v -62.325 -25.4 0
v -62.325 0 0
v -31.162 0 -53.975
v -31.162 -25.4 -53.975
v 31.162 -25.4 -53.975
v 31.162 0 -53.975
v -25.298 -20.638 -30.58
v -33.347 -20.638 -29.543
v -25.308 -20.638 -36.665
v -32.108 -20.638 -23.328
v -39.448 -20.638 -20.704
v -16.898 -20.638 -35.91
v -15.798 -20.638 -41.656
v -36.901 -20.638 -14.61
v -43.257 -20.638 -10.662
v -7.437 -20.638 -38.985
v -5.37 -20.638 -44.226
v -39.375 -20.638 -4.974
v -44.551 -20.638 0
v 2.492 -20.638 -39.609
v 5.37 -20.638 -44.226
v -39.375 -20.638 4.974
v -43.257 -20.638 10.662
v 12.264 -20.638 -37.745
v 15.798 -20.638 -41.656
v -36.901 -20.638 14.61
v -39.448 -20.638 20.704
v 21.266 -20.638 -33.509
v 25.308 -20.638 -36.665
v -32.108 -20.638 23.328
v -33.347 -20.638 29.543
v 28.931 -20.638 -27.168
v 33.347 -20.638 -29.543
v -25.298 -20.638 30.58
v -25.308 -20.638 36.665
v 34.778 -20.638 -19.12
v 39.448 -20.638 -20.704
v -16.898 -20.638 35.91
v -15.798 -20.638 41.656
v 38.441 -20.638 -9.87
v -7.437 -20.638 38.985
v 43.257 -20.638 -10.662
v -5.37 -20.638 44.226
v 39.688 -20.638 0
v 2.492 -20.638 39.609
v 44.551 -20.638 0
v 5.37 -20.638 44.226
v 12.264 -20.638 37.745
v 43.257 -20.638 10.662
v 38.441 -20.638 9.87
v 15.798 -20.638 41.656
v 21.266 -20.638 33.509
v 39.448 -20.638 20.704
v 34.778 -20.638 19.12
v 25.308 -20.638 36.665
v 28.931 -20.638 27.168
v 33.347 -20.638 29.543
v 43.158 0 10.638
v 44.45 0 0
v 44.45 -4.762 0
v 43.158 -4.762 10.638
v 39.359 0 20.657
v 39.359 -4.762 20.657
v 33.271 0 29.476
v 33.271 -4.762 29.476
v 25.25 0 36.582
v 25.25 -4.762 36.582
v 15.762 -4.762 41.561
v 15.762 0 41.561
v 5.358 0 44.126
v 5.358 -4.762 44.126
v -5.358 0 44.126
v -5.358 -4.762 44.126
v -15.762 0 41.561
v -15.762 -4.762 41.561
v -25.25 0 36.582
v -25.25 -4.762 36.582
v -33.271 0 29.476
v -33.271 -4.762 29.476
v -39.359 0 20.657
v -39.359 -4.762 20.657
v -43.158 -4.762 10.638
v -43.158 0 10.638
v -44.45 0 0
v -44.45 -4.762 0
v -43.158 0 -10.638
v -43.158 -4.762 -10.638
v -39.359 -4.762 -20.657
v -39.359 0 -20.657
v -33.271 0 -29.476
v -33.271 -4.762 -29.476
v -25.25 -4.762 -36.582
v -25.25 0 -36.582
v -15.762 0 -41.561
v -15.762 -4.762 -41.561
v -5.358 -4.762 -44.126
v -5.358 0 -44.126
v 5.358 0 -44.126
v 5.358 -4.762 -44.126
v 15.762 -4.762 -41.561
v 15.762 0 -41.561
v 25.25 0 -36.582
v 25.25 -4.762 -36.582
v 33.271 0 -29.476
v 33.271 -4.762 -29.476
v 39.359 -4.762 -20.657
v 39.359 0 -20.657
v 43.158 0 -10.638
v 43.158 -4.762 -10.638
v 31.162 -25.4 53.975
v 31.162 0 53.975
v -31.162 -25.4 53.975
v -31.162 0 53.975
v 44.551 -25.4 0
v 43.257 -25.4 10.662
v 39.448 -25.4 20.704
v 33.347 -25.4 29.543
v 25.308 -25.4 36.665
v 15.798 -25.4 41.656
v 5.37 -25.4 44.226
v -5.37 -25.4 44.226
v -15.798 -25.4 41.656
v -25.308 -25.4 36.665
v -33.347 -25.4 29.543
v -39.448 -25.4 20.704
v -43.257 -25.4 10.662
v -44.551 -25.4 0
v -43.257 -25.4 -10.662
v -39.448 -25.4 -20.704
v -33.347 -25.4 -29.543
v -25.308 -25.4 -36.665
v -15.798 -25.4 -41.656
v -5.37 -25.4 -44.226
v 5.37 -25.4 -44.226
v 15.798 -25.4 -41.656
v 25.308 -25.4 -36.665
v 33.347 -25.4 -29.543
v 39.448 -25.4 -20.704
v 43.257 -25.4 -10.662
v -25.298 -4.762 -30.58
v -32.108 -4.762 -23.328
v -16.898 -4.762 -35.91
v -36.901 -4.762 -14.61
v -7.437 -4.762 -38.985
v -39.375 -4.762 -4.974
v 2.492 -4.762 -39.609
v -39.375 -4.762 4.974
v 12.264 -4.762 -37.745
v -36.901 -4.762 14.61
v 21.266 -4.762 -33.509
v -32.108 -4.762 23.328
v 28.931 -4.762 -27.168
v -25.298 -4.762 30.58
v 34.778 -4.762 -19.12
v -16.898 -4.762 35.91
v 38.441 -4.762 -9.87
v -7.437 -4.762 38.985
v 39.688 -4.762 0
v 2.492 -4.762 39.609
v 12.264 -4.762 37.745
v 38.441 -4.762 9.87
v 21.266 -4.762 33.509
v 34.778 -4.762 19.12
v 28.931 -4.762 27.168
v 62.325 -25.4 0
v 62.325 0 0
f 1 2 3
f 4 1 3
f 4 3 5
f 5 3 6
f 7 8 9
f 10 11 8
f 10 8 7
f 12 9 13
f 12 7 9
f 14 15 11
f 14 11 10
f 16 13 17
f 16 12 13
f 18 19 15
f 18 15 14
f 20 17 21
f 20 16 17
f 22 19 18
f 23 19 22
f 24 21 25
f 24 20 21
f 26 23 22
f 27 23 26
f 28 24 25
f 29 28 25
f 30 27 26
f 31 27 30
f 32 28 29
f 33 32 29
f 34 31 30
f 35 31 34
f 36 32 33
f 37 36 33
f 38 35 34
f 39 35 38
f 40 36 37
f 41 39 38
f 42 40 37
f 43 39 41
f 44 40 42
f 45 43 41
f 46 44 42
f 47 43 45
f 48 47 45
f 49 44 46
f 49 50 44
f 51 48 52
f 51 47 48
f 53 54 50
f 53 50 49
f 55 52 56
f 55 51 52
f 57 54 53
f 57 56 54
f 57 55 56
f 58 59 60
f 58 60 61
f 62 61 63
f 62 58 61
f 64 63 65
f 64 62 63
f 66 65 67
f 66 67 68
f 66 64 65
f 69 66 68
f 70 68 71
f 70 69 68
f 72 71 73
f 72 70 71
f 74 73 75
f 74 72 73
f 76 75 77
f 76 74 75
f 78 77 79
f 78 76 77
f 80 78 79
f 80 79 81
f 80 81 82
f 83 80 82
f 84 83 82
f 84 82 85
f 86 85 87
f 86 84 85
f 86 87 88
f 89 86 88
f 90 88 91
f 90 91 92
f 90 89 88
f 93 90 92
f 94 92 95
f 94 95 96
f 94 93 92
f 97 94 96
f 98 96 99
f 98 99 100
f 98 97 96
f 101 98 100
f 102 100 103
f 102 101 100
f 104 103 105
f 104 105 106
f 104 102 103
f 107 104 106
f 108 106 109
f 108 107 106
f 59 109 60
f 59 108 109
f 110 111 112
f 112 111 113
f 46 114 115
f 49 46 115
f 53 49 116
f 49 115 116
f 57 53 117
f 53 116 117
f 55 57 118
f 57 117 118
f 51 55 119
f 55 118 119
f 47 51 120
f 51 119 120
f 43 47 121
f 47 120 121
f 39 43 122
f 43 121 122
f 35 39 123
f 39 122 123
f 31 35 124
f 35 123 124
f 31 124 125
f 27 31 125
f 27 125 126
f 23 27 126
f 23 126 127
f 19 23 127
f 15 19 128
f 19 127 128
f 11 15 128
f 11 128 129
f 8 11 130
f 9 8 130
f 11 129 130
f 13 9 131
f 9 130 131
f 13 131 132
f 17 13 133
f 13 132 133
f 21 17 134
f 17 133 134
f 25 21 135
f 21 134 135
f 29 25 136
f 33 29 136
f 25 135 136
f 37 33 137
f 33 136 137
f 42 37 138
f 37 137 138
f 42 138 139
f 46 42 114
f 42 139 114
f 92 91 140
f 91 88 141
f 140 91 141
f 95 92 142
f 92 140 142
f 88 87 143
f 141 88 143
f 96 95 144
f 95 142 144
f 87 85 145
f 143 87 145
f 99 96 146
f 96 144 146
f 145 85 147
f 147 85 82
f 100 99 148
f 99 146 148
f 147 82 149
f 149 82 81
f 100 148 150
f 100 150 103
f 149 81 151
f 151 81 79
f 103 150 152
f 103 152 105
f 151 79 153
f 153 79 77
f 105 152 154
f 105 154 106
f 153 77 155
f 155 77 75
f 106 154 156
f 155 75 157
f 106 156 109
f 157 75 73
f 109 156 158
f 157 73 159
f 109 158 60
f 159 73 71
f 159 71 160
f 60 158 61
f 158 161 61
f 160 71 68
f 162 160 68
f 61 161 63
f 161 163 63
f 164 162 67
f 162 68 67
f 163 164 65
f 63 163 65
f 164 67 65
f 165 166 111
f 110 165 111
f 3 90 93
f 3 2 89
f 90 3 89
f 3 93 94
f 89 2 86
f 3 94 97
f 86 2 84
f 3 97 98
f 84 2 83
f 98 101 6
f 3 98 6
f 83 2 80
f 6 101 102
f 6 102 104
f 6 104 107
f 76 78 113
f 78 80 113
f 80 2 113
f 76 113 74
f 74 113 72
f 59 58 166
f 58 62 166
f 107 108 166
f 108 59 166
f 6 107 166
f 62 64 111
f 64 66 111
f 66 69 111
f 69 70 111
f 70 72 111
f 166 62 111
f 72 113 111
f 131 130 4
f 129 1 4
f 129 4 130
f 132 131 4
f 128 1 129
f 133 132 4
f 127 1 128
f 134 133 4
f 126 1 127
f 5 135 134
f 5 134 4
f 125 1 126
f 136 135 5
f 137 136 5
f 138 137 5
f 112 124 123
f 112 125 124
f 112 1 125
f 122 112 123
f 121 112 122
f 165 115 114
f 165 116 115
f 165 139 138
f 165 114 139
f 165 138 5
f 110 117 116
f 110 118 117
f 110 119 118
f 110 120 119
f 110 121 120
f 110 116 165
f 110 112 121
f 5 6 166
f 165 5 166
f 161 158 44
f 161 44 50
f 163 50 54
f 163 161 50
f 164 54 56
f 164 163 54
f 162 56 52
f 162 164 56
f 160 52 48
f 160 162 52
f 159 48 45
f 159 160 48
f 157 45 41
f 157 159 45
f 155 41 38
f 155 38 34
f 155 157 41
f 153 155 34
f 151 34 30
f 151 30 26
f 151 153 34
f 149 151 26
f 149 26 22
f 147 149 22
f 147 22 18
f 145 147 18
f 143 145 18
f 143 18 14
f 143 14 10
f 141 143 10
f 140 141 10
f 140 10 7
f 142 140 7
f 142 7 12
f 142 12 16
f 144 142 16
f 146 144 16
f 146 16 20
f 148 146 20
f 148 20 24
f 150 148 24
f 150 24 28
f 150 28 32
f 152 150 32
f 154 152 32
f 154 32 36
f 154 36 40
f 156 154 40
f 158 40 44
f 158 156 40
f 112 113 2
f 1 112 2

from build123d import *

# Parameters (mm, degrees)
F0_R     = 39.6875
F1_DEPTH = 25.4
F2_R     = 44.45
F3_DEPTH = 4.7625
F4_R     = 44.551262
F4_R_2   = 39.6875
F5_DEPTH = 4.7625


with BuildPart() as f1:
    # F0 (on Front) → F1 (new body)
    with BuildSketch(Plane.XZ):
        Polygon((31.162481, 53.975), (-31.162481, 53.975), (-62.324962, 0), (-31.162481, -53.975), (31.162481, -53.975), (62.324962, 0), align=None)
        Circle(F0_R, mode=Mode.SUBTRACT)
    extrude(amount=F1_DEPTH)

    # F2 (on Front) → F3 (cut)
    with BuildSketch(Plane.XZ):
        Circle(F2_R)
    extrude(amount=F3_DEPTH, mode=Mode.SUBTRACT)

    # F4 (on face) → F5 (cut)
    with BuildSketch(Plane.XZ.offset(25.4)):
        Circle(F4_R)
        Circle(F4_R_2, mode=Mode.SUBTRACT)
    extrude(amount=-F5_DEPTH, mode=Mode.SUBTRACT)


solid = f1.part
